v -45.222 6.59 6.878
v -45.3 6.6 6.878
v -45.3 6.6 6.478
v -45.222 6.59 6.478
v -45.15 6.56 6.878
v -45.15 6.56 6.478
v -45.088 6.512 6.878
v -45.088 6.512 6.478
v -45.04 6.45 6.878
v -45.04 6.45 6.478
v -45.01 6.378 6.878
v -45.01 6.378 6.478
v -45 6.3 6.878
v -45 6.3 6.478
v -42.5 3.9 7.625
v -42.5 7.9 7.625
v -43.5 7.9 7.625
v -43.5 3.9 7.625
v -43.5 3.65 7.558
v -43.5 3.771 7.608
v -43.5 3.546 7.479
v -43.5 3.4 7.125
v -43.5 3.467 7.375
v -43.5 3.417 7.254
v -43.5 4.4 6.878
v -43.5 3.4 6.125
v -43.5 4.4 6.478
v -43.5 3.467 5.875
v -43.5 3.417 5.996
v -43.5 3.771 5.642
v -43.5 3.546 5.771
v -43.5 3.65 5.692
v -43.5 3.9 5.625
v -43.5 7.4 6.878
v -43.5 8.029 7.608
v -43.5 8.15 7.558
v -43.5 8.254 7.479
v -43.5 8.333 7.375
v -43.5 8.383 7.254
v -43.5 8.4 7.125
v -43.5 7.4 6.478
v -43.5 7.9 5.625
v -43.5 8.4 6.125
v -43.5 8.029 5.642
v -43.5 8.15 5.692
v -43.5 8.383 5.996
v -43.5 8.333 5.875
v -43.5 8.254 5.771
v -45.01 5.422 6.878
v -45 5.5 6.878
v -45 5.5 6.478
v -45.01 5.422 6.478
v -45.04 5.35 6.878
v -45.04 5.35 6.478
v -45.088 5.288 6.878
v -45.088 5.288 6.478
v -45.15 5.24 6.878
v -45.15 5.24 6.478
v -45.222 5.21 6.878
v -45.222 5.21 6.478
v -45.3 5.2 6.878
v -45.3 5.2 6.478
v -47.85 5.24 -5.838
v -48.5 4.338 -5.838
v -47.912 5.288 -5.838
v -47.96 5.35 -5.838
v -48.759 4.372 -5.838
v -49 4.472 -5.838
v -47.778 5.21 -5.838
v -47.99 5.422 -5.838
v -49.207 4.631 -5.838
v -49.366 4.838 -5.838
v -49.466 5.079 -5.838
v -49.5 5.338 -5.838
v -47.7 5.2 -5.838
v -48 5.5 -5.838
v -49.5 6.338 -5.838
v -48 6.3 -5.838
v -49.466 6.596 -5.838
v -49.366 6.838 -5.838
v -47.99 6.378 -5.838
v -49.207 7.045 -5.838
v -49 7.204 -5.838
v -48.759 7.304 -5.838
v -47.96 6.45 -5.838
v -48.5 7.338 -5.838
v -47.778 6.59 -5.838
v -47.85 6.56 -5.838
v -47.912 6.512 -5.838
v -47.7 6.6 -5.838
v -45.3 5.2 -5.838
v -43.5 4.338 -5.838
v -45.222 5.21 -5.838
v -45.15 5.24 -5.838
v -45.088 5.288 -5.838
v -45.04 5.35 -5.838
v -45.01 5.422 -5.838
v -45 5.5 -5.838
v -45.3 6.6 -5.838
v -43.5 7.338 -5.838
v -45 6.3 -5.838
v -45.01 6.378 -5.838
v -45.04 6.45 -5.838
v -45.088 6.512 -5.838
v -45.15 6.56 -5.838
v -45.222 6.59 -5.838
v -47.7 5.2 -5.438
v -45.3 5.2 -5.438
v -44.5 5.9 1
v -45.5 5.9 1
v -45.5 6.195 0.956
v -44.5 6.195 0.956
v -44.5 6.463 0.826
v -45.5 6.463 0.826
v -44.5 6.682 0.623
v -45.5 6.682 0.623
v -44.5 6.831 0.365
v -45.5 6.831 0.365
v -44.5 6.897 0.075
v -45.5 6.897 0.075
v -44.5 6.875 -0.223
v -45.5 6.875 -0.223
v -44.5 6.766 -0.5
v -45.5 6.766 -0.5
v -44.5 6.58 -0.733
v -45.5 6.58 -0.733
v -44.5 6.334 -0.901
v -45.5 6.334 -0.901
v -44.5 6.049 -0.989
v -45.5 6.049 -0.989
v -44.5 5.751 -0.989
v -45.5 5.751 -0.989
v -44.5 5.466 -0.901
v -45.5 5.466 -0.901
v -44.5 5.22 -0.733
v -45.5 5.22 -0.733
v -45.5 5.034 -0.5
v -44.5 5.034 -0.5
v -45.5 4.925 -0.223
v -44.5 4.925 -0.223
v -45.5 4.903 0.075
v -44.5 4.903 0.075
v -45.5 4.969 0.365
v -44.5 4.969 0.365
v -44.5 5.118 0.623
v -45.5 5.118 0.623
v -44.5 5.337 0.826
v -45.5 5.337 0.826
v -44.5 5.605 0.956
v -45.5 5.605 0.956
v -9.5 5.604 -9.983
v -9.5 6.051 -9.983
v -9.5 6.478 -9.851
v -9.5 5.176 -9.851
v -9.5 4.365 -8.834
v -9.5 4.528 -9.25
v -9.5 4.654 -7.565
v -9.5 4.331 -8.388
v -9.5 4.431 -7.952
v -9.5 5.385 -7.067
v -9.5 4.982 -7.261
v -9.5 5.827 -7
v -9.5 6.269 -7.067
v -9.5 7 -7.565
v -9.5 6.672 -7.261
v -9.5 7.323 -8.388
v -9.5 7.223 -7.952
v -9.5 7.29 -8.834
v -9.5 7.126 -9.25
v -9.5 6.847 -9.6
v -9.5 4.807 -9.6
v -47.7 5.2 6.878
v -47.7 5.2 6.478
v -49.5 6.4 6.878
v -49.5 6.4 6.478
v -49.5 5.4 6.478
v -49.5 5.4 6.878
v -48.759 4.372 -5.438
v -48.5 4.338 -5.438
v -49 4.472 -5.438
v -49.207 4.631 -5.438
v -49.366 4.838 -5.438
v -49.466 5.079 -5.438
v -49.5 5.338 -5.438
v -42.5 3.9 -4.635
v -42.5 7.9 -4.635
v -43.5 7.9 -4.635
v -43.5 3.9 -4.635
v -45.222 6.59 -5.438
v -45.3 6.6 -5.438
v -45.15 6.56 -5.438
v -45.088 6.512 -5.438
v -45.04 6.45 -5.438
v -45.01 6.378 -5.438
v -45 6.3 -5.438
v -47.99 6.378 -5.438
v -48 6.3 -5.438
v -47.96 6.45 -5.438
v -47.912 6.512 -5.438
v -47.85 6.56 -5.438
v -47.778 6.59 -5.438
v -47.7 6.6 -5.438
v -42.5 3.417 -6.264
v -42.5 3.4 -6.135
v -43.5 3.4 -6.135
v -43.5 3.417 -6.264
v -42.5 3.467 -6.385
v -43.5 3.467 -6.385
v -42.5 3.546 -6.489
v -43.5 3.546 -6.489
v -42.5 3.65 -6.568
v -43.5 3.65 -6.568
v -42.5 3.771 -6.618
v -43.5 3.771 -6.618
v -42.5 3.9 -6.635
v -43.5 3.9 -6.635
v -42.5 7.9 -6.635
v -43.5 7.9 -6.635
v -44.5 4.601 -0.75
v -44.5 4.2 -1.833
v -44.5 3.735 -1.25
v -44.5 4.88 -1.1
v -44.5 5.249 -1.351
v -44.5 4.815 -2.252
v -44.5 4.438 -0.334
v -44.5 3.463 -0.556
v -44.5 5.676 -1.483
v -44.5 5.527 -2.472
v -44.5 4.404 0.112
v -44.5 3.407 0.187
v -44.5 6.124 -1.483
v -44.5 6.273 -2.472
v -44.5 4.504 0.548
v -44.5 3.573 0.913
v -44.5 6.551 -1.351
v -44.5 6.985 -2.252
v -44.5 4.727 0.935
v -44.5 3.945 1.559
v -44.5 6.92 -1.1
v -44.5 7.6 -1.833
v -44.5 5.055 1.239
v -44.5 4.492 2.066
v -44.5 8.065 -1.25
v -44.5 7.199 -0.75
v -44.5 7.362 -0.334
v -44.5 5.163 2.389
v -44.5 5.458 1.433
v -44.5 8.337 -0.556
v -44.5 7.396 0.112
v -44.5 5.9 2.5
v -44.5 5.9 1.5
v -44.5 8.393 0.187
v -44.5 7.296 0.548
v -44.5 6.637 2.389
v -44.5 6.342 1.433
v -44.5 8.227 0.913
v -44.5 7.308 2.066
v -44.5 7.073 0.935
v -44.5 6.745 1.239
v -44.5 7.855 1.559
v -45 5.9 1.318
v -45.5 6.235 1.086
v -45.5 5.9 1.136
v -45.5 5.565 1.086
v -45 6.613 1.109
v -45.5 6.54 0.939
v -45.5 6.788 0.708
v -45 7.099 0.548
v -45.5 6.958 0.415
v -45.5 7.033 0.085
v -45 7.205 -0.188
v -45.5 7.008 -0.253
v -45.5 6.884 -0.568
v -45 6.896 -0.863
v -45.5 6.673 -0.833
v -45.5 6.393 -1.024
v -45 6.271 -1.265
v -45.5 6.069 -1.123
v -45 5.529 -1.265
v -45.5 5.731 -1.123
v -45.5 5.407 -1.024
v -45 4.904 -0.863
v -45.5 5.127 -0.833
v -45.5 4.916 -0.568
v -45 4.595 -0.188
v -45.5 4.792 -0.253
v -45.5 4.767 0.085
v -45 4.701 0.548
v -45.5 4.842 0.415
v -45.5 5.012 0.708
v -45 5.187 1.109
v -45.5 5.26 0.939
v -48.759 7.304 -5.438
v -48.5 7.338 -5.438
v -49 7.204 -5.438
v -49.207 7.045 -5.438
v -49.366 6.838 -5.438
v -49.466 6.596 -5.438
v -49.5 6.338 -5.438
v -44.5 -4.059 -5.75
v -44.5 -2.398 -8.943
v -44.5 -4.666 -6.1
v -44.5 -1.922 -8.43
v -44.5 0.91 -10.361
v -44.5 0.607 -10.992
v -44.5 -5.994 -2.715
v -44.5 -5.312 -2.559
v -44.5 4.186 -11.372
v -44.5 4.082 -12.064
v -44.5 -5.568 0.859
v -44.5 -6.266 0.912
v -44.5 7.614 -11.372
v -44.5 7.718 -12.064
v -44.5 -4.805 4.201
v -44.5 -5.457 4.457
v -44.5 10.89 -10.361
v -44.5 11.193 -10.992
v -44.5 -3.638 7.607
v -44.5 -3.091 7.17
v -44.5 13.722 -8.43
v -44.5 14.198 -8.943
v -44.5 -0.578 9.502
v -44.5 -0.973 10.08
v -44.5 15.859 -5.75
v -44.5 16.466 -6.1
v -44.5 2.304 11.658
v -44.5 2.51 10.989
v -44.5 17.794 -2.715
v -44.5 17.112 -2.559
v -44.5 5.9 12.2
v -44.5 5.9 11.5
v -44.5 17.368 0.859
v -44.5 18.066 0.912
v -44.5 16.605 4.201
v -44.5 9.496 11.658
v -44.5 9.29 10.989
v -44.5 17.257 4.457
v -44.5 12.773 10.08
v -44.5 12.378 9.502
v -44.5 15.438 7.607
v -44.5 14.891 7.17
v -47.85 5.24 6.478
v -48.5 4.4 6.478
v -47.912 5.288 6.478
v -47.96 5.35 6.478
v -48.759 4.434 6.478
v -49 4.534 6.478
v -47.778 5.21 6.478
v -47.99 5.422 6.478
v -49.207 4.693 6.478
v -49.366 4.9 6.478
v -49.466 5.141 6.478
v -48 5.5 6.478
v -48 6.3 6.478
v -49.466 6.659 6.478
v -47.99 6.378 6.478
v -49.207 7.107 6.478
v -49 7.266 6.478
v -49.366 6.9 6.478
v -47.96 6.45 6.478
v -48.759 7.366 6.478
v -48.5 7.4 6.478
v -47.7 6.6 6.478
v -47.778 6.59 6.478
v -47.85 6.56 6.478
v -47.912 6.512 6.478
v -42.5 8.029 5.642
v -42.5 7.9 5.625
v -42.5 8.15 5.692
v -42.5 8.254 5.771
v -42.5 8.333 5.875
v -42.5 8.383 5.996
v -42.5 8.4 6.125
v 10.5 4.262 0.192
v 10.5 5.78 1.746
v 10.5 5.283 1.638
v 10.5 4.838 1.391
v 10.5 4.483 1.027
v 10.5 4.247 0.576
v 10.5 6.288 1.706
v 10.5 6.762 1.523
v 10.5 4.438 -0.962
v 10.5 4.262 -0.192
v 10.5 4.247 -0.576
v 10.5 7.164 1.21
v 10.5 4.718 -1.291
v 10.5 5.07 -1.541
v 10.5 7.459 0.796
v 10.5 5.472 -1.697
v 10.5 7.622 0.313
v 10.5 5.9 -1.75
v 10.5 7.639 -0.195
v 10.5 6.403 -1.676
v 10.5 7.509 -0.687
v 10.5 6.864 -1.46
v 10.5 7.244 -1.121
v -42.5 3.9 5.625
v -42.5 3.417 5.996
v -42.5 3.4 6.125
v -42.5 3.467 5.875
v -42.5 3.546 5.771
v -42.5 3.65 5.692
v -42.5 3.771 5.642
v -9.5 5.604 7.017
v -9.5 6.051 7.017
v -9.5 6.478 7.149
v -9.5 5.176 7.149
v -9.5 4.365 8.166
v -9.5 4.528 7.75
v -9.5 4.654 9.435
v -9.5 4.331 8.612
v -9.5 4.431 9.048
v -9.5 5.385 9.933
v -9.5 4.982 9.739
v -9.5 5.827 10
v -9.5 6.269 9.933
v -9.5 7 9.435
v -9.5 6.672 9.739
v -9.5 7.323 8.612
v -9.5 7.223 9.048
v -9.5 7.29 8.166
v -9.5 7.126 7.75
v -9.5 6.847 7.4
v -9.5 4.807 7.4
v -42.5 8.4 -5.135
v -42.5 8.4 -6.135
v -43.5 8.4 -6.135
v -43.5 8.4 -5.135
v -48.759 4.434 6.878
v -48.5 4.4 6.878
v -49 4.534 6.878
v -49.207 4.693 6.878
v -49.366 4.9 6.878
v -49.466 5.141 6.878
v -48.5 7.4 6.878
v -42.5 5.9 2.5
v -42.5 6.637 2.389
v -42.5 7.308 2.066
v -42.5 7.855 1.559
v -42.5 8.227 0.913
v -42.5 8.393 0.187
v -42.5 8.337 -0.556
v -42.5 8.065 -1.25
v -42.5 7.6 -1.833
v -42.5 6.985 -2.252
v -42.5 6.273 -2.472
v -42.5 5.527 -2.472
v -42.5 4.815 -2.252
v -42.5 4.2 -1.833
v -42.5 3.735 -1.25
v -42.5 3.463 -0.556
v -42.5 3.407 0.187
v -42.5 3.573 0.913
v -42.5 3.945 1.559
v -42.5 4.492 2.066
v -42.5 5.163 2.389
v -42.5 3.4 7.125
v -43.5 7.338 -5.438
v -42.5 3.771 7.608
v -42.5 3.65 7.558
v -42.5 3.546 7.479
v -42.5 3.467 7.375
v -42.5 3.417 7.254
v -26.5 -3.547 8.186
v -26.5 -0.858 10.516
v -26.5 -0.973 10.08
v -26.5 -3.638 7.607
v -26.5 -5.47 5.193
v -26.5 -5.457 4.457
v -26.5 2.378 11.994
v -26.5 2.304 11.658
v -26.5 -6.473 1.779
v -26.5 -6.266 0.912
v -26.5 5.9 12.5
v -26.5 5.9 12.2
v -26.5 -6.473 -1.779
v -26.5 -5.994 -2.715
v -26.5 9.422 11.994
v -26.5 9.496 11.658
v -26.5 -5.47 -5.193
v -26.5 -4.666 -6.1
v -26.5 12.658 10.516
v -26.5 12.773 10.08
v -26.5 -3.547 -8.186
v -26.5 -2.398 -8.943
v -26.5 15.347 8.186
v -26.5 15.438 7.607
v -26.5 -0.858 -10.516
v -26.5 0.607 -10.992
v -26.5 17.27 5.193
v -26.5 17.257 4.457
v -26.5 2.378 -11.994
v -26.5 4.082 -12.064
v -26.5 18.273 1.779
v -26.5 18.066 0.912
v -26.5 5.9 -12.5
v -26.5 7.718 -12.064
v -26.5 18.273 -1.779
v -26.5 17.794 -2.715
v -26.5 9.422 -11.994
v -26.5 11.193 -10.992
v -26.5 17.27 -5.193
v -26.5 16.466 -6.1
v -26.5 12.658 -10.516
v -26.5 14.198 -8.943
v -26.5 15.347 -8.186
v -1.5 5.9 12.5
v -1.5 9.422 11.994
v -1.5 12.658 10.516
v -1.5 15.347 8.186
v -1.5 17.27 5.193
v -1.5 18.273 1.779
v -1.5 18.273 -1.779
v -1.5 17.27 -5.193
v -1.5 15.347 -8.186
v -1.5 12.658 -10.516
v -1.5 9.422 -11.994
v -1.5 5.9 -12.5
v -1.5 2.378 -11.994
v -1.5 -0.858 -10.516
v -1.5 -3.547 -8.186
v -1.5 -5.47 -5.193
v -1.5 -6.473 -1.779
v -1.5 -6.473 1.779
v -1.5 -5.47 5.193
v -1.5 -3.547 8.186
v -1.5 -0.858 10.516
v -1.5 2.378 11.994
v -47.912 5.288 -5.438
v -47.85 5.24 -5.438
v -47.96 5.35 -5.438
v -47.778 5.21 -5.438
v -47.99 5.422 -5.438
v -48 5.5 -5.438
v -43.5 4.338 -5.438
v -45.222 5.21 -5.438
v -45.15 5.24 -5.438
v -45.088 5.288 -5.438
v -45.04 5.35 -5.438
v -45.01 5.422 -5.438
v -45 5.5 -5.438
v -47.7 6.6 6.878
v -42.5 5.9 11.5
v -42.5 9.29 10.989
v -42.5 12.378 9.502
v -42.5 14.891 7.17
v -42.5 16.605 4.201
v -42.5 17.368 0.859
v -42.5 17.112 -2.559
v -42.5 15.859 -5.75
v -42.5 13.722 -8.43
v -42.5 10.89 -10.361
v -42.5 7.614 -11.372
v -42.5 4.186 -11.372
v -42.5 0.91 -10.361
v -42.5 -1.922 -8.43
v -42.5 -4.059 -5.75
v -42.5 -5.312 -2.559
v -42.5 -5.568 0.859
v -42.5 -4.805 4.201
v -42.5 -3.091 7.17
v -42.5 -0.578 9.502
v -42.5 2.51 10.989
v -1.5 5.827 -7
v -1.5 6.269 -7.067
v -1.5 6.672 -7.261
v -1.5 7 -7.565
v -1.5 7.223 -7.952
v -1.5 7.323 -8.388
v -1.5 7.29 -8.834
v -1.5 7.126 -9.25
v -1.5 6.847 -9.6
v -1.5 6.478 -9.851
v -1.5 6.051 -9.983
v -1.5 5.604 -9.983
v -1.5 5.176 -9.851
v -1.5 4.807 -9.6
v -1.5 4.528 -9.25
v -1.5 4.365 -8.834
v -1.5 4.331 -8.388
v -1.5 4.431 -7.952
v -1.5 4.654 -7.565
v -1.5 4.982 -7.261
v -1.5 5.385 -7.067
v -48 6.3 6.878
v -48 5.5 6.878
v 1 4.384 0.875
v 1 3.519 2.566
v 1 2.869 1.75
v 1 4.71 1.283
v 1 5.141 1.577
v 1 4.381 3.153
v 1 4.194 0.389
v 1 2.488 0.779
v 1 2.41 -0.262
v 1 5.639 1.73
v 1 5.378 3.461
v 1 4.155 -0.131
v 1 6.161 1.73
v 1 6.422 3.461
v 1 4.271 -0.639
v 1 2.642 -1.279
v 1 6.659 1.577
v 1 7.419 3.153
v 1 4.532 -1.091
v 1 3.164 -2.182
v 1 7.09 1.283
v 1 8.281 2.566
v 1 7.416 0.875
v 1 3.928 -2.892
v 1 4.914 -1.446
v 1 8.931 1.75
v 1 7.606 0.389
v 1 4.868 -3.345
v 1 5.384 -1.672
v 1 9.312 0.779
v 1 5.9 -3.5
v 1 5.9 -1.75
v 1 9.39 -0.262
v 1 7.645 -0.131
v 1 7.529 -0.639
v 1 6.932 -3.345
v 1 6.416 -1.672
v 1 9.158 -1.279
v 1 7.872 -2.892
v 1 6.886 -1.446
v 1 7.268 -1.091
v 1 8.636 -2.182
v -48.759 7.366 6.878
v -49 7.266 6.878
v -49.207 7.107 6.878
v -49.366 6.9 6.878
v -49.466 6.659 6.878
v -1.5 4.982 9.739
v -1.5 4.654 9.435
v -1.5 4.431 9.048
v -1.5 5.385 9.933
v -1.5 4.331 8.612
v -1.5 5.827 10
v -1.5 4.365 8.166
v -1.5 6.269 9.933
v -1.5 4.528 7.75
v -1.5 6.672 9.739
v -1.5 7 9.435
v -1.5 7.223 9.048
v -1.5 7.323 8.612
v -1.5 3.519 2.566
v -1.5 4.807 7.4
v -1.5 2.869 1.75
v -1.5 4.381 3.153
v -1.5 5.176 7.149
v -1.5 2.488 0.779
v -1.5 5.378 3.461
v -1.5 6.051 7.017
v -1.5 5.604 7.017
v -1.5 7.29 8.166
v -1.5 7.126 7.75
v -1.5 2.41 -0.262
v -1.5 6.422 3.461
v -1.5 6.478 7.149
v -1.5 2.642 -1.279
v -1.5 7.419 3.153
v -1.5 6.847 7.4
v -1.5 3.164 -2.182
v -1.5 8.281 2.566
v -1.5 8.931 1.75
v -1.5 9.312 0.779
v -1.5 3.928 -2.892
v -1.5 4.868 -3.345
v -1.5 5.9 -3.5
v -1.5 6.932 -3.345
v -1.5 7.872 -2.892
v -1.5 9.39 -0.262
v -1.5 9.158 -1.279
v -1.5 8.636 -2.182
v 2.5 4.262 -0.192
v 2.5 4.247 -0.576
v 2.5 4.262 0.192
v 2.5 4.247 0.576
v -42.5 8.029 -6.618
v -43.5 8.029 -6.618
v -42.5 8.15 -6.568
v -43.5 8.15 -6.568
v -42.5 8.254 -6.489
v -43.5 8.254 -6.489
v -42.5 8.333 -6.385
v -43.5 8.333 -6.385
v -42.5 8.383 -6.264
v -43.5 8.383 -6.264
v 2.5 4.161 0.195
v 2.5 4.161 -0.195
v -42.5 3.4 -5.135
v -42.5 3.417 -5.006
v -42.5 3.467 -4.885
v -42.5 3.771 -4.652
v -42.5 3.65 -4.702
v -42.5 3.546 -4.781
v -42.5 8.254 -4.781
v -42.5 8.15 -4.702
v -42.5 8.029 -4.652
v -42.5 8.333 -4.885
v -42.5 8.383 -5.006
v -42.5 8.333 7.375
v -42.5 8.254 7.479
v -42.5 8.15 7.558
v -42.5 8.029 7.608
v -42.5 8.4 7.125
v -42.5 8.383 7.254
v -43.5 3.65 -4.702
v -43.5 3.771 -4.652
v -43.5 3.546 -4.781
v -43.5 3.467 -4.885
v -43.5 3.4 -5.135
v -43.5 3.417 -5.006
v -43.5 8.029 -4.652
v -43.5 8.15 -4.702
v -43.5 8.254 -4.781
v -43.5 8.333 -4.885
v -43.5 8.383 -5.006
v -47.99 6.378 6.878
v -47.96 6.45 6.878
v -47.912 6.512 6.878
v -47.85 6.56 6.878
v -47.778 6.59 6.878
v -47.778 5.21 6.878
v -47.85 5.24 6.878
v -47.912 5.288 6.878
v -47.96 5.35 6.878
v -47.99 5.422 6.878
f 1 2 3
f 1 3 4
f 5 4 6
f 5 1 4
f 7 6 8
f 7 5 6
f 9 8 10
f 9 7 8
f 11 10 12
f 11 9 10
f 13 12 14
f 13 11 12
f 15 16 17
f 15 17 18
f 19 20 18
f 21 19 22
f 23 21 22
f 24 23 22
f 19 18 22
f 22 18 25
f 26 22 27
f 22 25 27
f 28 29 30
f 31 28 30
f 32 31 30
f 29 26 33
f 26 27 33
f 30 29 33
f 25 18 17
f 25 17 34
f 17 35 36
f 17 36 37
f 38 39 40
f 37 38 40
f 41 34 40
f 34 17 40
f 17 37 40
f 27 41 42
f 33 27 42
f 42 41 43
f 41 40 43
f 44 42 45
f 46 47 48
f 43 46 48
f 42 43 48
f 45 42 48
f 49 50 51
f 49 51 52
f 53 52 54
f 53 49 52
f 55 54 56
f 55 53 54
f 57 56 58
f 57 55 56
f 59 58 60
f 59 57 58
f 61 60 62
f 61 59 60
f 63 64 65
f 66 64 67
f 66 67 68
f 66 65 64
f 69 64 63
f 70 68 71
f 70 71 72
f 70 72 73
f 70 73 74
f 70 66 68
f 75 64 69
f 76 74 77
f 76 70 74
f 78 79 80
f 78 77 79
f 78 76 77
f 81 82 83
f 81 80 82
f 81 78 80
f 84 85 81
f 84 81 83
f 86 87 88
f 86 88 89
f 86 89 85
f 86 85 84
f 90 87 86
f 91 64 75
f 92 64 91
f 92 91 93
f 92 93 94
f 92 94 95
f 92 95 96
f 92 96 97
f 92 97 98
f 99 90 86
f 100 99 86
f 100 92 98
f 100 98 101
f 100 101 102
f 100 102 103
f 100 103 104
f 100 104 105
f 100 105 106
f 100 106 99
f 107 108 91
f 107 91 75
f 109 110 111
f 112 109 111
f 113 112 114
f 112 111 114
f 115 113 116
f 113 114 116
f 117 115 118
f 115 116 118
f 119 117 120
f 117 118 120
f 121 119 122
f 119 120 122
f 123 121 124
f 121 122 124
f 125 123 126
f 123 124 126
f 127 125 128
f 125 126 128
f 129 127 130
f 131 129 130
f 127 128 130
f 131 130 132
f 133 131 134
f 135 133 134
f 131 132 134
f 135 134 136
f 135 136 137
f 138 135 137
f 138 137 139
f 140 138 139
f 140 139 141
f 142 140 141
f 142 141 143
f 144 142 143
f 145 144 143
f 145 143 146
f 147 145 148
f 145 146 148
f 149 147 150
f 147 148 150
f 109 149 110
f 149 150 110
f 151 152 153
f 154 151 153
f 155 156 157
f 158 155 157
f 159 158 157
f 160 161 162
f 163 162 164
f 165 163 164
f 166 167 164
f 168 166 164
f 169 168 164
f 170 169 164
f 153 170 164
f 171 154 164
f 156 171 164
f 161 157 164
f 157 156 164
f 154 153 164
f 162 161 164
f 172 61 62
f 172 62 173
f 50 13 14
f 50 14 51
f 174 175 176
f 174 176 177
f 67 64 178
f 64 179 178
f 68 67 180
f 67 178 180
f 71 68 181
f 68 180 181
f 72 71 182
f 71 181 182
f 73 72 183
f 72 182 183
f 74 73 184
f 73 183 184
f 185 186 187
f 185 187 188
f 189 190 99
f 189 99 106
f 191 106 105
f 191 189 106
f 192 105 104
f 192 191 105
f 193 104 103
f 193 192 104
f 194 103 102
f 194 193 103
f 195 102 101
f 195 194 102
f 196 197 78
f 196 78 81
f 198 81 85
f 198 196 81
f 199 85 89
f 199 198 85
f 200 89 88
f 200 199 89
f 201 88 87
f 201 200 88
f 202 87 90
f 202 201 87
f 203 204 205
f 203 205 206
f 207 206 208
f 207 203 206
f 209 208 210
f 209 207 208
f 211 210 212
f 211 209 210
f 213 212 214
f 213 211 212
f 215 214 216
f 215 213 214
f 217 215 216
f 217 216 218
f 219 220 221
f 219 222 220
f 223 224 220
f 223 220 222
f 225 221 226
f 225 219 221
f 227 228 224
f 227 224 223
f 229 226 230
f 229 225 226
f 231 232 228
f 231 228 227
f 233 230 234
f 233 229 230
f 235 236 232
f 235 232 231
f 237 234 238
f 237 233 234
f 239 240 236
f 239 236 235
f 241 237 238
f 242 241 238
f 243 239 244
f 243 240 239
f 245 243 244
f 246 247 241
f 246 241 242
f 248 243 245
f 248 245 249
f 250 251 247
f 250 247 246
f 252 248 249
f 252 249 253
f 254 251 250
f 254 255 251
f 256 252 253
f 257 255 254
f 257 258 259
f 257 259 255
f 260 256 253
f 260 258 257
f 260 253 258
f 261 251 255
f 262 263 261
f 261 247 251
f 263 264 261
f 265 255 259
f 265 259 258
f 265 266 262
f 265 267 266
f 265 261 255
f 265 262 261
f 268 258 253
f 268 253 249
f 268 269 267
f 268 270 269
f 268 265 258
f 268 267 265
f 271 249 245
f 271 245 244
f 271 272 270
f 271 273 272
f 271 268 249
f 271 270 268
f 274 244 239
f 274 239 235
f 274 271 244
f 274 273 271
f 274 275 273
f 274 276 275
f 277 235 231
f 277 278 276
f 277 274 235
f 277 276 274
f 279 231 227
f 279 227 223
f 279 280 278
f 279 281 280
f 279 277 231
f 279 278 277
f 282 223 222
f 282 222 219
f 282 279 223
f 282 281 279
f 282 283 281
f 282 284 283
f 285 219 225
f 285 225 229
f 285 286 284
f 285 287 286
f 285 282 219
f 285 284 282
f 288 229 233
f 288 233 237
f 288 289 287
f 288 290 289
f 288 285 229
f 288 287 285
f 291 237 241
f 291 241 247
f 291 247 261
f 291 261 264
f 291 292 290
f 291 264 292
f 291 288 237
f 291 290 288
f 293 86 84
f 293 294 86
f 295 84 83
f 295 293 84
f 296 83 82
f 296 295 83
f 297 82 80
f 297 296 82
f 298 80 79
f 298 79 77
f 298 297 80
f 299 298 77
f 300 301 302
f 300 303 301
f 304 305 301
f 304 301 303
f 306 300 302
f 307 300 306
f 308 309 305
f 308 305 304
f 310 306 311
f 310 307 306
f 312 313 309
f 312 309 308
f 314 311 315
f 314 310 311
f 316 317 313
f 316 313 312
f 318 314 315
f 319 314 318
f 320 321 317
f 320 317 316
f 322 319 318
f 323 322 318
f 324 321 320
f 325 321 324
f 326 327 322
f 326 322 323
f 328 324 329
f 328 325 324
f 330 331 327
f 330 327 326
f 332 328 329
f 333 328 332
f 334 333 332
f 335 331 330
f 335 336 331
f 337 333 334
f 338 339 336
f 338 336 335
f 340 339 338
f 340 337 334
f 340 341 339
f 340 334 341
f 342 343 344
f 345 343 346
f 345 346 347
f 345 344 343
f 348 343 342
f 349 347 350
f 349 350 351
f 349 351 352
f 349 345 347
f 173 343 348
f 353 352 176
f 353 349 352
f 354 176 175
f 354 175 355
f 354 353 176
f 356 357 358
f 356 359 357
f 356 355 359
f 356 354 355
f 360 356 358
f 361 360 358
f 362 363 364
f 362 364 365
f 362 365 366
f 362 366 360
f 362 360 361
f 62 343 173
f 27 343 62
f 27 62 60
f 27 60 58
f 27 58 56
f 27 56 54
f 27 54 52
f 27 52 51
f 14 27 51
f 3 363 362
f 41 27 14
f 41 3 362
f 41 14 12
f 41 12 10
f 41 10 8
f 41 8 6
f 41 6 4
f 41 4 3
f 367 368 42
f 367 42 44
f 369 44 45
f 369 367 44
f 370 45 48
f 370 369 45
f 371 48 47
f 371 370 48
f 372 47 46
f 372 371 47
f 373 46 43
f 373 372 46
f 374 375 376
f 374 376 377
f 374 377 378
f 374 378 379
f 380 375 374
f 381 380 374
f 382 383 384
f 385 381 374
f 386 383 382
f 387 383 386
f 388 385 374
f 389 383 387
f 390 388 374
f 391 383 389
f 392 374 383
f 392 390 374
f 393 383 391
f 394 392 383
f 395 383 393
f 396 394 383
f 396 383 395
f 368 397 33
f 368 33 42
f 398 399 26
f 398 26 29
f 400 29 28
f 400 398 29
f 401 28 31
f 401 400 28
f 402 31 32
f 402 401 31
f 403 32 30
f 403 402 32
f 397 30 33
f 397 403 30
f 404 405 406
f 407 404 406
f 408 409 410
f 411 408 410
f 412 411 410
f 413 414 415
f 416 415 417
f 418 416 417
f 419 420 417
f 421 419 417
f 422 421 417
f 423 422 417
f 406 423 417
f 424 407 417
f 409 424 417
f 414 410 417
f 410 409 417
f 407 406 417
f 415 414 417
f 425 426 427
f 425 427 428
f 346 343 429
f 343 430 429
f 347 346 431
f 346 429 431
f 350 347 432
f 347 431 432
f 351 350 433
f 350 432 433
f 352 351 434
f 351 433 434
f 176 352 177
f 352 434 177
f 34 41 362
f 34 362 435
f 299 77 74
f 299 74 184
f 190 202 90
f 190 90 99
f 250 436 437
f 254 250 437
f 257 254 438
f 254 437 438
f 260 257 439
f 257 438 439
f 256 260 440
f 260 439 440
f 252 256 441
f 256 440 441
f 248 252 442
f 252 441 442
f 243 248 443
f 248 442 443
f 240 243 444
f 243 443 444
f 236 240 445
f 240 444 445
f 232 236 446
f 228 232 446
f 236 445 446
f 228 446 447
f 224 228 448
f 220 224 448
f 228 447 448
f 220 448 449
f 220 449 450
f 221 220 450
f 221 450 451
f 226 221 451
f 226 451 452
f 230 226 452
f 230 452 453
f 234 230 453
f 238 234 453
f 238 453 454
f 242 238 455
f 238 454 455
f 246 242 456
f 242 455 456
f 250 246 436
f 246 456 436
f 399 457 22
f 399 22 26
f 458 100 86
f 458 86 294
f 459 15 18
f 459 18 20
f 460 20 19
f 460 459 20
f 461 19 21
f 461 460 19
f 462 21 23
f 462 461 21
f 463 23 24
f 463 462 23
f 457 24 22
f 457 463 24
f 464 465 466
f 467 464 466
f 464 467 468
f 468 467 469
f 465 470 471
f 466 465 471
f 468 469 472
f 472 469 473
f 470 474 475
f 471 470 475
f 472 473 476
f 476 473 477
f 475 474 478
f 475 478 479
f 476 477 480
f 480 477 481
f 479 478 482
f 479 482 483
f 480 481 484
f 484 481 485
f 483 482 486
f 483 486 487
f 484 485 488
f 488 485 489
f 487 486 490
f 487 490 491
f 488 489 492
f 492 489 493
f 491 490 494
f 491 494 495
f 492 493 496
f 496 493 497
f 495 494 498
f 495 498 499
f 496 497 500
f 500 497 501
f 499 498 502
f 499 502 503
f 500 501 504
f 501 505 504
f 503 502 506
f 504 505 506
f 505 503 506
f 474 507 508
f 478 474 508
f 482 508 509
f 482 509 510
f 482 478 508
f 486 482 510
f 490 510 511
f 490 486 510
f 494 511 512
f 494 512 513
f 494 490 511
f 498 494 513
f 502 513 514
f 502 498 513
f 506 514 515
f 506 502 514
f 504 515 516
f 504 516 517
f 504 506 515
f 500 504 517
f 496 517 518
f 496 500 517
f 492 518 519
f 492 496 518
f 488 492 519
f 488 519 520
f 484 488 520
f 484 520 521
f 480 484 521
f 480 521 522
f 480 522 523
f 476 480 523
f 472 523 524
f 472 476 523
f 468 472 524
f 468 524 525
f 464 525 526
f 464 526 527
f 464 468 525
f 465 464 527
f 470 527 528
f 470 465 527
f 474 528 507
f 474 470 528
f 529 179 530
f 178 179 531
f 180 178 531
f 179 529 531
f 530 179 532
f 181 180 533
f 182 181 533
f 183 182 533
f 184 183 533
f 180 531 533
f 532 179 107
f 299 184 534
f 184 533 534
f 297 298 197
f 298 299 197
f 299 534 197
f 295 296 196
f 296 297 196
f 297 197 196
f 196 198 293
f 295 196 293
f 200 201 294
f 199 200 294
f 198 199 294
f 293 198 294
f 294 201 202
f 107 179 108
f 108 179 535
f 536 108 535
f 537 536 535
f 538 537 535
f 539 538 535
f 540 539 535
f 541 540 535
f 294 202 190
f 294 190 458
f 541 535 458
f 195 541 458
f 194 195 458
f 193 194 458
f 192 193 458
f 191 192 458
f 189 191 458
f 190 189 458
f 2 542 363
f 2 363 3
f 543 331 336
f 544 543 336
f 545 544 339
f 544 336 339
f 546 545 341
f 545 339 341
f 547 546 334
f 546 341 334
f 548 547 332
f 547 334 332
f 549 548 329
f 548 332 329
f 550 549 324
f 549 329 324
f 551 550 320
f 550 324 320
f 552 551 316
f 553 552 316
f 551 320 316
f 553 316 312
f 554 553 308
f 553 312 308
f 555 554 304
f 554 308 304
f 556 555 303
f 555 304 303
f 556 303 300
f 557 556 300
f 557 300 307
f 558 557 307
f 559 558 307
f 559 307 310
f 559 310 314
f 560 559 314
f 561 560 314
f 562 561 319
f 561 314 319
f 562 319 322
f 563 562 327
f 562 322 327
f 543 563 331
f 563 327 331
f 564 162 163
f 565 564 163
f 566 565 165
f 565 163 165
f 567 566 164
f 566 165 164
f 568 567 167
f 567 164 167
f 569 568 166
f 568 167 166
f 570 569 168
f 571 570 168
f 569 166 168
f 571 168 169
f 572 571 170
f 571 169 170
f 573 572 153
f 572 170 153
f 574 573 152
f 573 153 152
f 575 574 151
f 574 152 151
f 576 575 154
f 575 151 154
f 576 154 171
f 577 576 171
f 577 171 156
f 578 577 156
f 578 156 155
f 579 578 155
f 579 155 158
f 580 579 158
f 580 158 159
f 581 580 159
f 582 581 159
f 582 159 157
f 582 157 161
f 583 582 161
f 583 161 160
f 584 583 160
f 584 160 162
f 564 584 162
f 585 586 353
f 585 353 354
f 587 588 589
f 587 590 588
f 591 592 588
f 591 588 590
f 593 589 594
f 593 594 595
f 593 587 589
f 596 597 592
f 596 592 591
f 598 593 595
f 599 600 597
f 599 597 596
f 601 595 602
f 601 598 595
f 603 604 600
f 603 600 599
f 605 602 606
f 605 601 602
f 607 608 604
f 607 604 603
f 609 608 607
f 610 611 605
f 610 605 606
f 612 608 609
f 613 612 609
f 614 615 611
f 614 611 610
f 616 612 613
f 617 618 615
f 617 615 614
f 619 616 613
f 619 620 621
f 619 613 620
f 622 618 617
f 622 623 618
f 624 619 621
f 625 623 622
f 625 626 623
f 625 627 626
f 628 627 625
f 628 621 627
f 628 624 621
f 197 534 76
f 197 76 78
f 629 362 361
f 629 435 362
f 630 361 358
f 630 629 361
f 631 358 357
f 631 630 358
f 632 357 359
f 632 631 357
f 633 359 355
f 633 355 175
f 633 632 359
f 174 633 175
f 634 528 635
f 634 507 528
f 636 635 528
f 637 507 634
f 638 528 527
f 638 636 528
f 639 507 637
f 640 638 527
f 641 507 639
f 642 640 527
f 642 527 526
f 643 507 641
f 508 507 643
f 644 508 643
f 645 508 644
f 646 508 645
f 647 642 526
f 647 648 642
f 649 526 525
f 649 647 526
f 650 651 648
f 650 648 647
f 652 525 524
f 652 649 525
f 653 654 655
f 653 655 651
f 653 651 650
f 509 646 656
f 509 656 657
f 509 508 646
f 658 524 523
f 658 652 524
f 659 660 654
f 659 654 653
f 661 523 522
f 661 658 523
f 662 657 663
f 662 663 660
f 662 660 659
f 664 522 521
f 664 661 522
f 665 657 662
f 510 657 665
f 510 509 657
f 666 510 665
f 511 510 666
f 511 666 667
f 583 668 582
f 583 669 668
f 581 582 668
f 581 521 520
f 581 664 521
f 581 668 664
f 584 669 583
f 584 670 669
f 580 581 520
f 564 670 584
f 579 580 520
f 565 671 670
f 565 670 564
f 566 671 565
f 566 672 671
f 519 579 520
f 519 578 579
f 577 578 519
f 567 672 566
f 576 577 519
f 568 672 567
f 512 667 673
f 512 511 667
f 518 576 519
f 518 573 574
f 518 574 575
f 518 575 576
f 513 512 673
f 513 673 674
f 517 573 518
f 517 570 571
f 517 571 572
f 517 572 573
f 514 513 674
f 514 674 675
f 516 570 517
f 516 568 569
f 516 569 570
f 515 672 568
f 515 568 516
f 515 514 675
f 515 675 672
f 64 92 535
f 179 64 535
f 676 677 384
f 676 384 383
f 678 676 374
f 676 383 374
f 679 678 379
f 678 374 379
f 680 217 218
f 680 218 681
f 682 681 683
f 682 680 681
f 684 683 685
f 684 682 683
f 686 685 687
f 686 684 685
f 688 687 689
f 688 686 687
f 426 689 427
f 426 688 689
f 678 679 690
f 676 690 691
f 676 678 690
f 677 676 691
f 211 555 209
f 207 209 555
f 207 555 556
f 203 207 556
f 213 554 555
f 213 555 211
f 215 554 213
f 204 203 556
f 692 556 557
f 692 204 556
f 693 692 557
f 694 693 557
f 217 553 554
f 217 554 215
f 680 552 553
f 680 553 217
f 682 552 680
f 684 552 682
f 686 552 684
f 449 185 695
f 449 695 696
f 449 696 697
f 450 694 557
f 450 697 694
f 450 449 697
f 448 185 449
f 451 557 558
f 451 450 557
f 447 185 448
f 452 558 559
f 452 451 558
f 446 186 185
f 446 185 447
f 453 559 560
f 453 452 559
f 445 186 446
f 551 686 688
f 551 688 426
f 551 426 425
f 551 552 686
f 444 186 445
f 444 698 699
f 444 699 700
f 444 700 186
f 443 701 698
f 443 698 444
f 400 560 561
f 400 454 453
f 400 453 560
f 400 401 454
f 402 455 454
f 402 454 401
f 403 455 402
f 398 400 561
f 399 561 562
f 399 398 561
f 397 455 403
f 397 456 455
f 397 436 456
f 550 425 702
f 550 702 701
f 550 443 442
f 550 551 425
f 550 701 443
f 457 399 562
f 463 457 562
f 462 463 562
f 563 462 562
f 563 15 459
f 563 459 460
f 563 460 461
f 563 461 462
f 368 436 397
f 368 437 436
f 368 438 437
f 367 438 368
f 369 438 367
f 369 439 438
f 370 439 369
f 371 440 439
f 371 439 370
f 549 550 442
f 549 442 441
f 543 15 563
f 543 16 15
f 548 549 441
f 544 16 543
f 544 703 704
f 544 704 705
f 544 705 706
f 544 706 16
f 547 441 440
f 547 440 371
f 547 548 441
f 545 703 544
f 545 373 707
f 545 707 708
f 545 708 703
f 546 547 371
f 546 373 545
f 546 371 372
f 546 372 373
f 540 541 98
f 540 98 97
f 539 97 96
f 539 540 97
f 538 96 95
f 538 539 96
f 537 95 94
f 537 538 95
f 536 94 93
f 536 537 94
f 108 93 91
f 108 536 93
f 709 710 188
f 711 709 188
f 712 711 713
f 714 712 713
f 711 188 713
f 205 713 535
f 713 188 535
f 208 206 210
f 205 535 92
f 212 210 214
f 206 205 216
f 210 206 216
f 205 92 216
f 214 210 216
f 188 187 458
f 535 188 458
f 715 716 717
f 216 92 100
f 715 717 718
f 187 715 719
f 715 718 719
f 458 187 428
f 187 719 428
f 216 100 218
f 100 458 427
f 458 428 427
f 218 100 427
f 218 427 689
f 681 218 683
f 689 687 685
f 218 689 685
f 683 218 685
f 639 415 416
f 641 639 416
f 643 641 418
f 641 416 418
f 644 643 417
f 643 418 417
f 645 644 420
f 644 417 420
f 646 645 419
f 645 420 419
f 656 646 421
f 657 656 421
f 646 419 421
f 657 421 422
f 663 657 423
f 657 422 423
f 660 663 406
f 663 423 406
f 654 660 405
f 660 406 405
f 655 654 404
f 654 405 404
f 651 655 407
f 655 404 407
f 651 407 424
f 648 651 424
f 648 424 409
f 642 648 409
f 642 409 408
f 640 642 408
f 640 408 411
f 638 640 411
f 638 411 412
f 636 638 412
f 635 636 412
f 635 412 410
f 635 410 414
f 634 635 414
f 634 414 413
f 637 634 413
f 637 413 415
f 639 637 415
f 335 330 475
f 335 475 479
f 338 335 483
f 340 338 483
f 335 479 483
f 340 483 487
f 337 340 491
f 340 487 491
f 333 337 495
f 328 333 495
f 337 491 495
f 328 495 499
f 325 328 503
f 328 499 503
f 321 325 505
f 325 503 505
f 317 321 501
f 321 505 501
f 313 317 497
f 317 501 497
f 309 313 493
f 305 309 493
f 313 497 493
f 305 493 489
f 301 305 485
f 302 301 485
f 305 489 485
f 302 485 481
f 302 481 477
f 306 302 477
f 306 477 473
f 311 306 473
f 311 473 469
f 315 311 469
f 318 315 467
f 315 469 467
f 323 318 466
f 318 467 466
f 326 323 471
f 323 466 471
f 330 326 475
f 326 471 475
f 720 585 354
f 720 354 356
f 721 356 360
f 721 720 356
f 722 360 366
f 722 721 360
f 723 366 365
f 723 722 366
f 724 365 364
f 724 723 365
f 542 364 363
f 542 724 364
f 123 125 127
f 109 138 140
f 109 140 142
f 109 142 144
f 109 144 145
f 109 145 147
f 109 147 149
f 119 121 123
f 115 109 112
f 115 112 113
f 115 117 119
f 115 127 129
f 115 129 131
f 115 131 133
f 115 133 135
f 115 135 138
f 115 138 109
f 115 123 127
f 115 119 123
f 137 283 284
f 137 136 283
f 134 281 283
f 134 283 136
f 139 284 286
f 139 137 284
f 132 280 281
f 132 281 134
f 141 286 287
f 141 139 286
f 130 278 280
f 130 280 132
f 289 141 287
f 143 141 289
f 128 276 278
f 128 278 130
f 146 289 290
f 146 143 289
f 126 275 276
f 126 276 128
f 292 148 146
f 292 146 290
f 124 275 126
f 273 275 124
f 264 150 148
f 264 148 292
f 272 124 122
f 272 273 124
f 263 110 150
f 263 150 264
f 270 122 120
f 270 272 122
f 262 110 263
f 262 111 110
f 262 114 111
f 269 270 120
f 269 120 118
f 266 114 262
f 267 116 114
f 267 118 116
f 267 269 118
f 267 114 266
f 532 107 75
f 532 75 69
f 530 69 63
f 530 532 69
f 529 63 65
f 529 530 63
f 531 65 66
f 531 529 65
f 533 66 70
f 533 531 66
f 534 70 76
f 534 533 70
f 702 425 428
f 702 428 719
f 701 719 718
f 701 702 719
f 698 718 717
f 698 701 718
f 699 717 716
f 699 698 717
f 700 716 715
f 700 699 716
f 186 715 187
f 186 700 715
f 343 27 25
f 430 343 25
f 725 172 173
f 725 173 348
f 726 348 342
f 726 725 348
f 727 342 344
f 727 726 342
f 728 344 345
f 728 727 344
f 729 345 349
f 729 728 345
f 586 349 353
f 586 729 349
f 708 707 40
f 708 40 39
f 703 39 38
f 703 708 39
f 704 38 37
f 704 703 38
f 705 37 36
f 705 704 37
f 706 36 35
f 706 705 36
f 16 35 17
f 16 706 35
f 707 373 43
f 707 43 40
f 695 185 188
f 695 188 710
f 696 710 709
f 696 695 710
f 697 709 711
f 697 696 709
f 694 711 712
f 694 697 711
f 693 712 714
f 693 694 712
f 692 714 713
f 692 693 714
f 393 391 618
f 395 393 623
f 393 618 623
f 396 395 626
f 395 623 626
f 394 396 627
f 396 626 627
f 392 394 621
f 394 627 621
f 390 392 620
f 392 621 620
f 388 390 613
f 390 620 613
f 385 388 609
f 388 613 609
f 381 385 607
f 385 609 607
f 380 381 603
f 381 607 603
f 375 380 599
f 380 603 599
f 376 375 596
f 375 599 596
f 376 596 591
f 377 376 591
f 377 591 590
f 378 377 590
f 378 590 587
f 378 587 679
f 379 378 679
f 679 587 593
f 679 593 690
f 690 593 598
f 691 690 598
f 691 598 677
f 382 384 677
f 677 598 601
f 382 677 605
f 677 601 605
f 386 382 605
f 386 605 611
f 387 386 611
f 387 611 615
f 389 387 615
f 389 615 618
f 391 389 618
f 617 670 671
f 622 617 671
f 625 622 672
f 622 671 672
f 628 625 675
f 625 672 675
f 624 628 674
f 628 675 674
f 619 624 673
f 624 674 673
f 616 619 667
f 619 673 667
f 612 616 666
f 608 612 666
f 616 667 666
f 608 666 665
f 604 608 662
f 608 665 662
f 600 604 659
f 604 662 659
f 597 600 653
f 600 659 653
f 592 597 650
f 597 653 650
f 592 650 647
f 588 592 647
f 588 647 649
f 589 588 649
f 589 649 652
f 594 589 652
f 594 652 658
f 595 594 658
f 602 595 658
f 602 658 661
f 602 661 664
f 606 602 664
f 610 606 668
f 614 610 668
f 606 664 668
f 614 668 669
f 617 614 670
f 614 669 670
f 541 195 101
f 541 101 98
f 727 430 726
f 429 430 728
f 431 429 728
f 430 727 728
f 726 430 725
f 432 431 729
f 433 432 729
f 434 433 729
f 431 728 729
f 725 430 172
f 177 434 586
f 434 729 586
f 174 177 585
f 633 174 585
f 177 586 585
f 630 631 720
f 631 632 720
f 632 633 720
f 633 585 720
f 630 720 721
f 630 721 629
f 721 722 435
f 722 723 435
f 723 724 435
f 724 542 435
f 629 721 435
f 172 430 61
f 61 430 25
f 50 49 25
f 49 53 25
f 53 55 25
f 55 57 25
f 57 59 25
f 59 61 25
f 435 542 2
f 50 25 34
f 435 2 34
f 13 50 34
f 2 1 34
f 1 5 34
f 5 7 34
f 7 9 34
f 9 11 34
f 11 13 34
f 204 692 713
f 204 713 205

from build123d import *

# Parameters (mm, degrees)
CROQUIS1_W                        = 25
CROQUIS1_H                        = 12.5
CROQUIS2_R                        = 3.5
SALIENTE_EXTRUIR1_DEPTH           = 2.5
CROQUIS3_R                        = 1.75
SALIENTE_EXTRUIR2_DEPTH           = 9.5
CORTAR_EXTRUIR1_DEPTH             = 8
CROQUIS5_R                        = 12.2
SALIENTE_EXTRUIR3_DEPTH           = 18
DI_METRO_DE_TALADRO_3_0_3_1_D     = 3
DI_METRO_DE_TALADRO_3_0_3_1_DEPTH = 8
CROQUIS10_R                       = 11.5
CORTAR_EXTRUIR2_DEPTH             = 2
SALIENTE_EXTRUIR4_DEPTH           = 1
CROQUIS12_W                       = 0.4
CROQUIS12_H                       = 3
SALIENTE_EXTRUIR5_DEPTH           = 6
REDONDEO1_R                       = 1
CORTAR_EXTRUIR3_DEPTH             = 57.252161552
CROQUIS15_R                       = 2.5
SALIENTE_EXTRUIR6_DEPTH           = 2
CROQUIS16_R                       = 1.5
SALIENTE_EXTRUIR7_DEPTH           = 3
CHAFL_N1_SIZE2                    = 0.363970234
CHAFL_N1_SIZE                     = 1
CROQUIS17_R                       = 1
CORTAR_EXTRUIR4_DEPTH             = 1


with BuildPart() as part:
    # Croquis1 → Revolución1 (revolve)
    with BuildSketch(Plane(origin=(0, 0, 0), x_dir=(-1, 0, 0), z_dir=(0, 0, -1)), mode=Mode.PRIVATE) as revoluci_n1_sk:
        with Locations((14, 12.15)):
            Rectangle(CROQUIS1_W, CROQUIS1_H)
    revolve(revoluci_n1_sk.sketch.rotate(Axis((-1.5, 5.9, 0), (-1, 0, 0)), 270), axis=Axis((-1.5, 5.9, 0), (-1, 0, 0)))

    # Croquis2 → Saliente-Extruir1 (add)
    with BuildSketch(Plane(origin=(-1.5, 0, 0), x_dir=(0, 0, -1), z_dir=(1, 0, 0))):
        with Locations((0, 5.9)):
            Circle(CROQUIS2_R)
    extrude(amount=SALIENTE_EXTRUIR1_DEPTH)

    # Croquis3 → Saliente-Extruir2 (add)
    with BuildSketch(Plane(origin=(1, 0, 0), x_dir=(0, 0, -1), z_dir=(1, 0, 0))):
        with Locations((0, 5.9)):
            Circle(CROQUIS3_R)
    extrude(amount=SALIENTE_EXTRUIR2_DEPTH)

    # Croquis4 → Cortar-Extruir1 (cut)
    with BuildSketch(Plane(origin=(10.5, 0, 0), x_dir=(0, 0, -1), z_dir=(1, 0, 0))):
        with BuildLine():
            Line((-1.496663044, 4.15), (1.496663044, 4.15))
            ThreePointArc((1.496663044, 4.15), (0, 4.264202971), (-1.496663044, 4.15))
        make_face()
    extrude(amount=-CORTAR_EXTRUIR1_DEPTH, mode=Mode.SUBTRACT)

    # Croquis5 → Saliente-Extruir3 (add)
    with BuildSketch(Plane.ZY.offset(26.5)):
        with Locations((0, 5.9)):
            Circle(CROQUIS5_R)
    extrude(amount=SALIENTE_EXTRUIR3_DEPTH)

    # Diámetro de taladro Ø3.0 (3)1
    with Locations(Plane(origin=(-1.5, 0, 0), x_dir=(0, 0, -1), z_dir=(1, 0, 0))):
        with Locations((-8.5, 5.827133015), (8.5, 5.827133015)):
            Hole(DI_METRO_DE_TALADRO_3_0_3_1_D / 2, depth=DI_METRO_DE_TALADRO_3_0_3_1_DEPTH)

    # Croquis10 → Cortar-Extruir2 (cut)
    with BuildSketch(Plane.ZY.offset(44.5)):
        with Locations((0, 5.9)):
            Circle(CROQUIS10_R)
    extrude(amount=-CORTAR_EXTRUIR2_DEPTH, mode=Mode.SUBTRACT)

    # Croquis11 → Saliente-Extruir4 (add)
    with BuildSketch(Plane.ZY.offset(42.5)):
        with BuildLine():
            Line((-5.135046812, 3.4), (-6.135046812, 3.4))
            ThreePointArc((-6.135046812, 3.4), (-6.488600202, 3.546446609), (-6.635046812, 3.9))
            Line((-6.635046812, 3.9), (-6.635046812, 7.9))
            ThreePointArc((-6.635046812, 7.9), (-6.488600202, 8.253553391), (-6.135046812, 8.4))
            Line((-6.135046812, 8.4), (-5.135046812, 8.4))
            ThreePointArc((-5.135046812, 8.4), (-4.781493421, 8.253553391), (-4.635046812, 7.9))
            Line((-4.635046812, 7.9), (-4.635046812, 3.9))
            ThreePointArc((-4.635046812, 3.9), (-4.781493421, 3.546446609), (-5.135046812, 3.4))
        make_face()
        with BuildLine():
            Line((7.124953188, 3.4), (6.124953188, 3.4))
            ThreePointArc((6.124953188, 3.4), (5.771399798, 3.546446609), (5.624953188, 3.9))
            Line((5.624953188, 3.9), (5.624953188, 7.9))
            ThreePointArc((5.624953188, 7.9), (5.771399798, 8.253553391), (6.124953188, 8.4))
            Line((6.124953188, 8.4), (7.124953188, 8.4))
            ThreePointArc((7.124953188, 8.4), (7.478506579, 8.253553391), (7.624953188, 7.9))
            Line((7.624953188, 7.9), (7.624953188, 3.9))
            ThreePointArc((7.624953188, 3.9), (7.478506579, 3.546446609), (7.124953188, 3.4))
        make_face()
    extrude(amount=SALIENTE_EXTRUIR4_DEPTH)

    # Croquis12 → Saliente-Extruir5 (add)
    with BuildSketch(Plane.ZY.offset(43.5)):
        with Locations((-5.637636684, 5.837666005)):
            Rectangle(CROQUIS12_W, CROQUIS12_H)
        with Locations((6.677710889, 5.9)):
            Rectangle(CROQUIS12_W, CROQUIS12_H)
    extrude(amount=SALIENTE_EXTRUIR5_DEPTH)

    # Redondeo1
    redondeo1_edges = [part.edges().sort_by_distance(p)[0] for p in [
        (-49.5, 4.337666005, -5.637636684),
        (-49.5, 7.337666005, -5.637636684),
        (-49.5, 4.4, 6.677710889),
        (-49.5, 7.4, 6.677710889),
    ]]
    fillet(redondeo1_edges, radius=REDONDEO1_R)

    # Croquis14 → Cortar-Extruir3 (cut, through all)
    with BuildSketch(Plane.XY.offset(6.877710889)):
        with BuildLine():
            Line((-45.3, 5.2), (-47.7, 5.2))
            ThreePointArc((-47.7, 5.2), (-47.912132034, 5.287867966), (-48, 5.5))
            Line((-48, 5.5), (-48, 6.3))
            ThreePointArc((-48, 6.3), (-47.912132034, 6.512132034), (-47.7, 6.6))
            Line((-47.7, 6.6), (-45.3, 6.6))
            ThreePointArc((-45.3, 6.6), (-45.087867966, 6.512132034), (-45, 6.3))
            Line((-45, 6.3), (-45, 5.5))
            ThreePointArc((-45, 5.5), (-45.087867966, 5.287867966), (-45.3, 5.2))
        make_face()
    extrude(amount=-CORTAR_EXTRUIR3_DEPTH, mode=Mode.SUBTRACT)

    # Croquis15 → Saliente-Extruir6 (add)
    with BuildSketch(Plane.ZY.offset(42.5)):
        with Locations((0, 5.9)):
            Circle(CROQUIS15_R)
    extrude(amount=SALIENTE_EXTRUIR6_DEPTH)

    # Croquis16 → Saliente-Extruir7 (add)
    with BuildSketch(Plane.ZY.offset(42.5)):
        with Locations((0, 5.9)):
            Circle(CROQUIS16_R)
    extrude(amount=SALIENTE_EXTRUIR7_DEPTH)

    # Chaflán1
    chafl_n1_edges = [part.edges().sort_by_distance(p)[0] for p in [
        (-45.5, 5.9, -1.5),
    ]]
    chafl_n1_side = [part.faces().sort_by_distance(p)[0] for p in [
        (-45.492720595, 5.9, -1.5),
    ]]
    chamfer(chafl_n1_edges, length=CHAFL_N1_SIZE - 0.0001, length2=CHAFL_N1_SIZE2 - 0.0001, reference=chafl_n1_side[0])  # a hair under: the kernel refuses the full size

    # Croquis17 → Cortar-Extruir4 (cut)
    with BuildSketch(Plane.ZY.offset(45.5)):
        with Locations((0, 5.9)):
            Circle(CROQUIS17_R)
    extrude(amount=-CORTAR_EXTRUIR4_DEPTH, mode=Mode.SUBTRACT)


solid = part.part
